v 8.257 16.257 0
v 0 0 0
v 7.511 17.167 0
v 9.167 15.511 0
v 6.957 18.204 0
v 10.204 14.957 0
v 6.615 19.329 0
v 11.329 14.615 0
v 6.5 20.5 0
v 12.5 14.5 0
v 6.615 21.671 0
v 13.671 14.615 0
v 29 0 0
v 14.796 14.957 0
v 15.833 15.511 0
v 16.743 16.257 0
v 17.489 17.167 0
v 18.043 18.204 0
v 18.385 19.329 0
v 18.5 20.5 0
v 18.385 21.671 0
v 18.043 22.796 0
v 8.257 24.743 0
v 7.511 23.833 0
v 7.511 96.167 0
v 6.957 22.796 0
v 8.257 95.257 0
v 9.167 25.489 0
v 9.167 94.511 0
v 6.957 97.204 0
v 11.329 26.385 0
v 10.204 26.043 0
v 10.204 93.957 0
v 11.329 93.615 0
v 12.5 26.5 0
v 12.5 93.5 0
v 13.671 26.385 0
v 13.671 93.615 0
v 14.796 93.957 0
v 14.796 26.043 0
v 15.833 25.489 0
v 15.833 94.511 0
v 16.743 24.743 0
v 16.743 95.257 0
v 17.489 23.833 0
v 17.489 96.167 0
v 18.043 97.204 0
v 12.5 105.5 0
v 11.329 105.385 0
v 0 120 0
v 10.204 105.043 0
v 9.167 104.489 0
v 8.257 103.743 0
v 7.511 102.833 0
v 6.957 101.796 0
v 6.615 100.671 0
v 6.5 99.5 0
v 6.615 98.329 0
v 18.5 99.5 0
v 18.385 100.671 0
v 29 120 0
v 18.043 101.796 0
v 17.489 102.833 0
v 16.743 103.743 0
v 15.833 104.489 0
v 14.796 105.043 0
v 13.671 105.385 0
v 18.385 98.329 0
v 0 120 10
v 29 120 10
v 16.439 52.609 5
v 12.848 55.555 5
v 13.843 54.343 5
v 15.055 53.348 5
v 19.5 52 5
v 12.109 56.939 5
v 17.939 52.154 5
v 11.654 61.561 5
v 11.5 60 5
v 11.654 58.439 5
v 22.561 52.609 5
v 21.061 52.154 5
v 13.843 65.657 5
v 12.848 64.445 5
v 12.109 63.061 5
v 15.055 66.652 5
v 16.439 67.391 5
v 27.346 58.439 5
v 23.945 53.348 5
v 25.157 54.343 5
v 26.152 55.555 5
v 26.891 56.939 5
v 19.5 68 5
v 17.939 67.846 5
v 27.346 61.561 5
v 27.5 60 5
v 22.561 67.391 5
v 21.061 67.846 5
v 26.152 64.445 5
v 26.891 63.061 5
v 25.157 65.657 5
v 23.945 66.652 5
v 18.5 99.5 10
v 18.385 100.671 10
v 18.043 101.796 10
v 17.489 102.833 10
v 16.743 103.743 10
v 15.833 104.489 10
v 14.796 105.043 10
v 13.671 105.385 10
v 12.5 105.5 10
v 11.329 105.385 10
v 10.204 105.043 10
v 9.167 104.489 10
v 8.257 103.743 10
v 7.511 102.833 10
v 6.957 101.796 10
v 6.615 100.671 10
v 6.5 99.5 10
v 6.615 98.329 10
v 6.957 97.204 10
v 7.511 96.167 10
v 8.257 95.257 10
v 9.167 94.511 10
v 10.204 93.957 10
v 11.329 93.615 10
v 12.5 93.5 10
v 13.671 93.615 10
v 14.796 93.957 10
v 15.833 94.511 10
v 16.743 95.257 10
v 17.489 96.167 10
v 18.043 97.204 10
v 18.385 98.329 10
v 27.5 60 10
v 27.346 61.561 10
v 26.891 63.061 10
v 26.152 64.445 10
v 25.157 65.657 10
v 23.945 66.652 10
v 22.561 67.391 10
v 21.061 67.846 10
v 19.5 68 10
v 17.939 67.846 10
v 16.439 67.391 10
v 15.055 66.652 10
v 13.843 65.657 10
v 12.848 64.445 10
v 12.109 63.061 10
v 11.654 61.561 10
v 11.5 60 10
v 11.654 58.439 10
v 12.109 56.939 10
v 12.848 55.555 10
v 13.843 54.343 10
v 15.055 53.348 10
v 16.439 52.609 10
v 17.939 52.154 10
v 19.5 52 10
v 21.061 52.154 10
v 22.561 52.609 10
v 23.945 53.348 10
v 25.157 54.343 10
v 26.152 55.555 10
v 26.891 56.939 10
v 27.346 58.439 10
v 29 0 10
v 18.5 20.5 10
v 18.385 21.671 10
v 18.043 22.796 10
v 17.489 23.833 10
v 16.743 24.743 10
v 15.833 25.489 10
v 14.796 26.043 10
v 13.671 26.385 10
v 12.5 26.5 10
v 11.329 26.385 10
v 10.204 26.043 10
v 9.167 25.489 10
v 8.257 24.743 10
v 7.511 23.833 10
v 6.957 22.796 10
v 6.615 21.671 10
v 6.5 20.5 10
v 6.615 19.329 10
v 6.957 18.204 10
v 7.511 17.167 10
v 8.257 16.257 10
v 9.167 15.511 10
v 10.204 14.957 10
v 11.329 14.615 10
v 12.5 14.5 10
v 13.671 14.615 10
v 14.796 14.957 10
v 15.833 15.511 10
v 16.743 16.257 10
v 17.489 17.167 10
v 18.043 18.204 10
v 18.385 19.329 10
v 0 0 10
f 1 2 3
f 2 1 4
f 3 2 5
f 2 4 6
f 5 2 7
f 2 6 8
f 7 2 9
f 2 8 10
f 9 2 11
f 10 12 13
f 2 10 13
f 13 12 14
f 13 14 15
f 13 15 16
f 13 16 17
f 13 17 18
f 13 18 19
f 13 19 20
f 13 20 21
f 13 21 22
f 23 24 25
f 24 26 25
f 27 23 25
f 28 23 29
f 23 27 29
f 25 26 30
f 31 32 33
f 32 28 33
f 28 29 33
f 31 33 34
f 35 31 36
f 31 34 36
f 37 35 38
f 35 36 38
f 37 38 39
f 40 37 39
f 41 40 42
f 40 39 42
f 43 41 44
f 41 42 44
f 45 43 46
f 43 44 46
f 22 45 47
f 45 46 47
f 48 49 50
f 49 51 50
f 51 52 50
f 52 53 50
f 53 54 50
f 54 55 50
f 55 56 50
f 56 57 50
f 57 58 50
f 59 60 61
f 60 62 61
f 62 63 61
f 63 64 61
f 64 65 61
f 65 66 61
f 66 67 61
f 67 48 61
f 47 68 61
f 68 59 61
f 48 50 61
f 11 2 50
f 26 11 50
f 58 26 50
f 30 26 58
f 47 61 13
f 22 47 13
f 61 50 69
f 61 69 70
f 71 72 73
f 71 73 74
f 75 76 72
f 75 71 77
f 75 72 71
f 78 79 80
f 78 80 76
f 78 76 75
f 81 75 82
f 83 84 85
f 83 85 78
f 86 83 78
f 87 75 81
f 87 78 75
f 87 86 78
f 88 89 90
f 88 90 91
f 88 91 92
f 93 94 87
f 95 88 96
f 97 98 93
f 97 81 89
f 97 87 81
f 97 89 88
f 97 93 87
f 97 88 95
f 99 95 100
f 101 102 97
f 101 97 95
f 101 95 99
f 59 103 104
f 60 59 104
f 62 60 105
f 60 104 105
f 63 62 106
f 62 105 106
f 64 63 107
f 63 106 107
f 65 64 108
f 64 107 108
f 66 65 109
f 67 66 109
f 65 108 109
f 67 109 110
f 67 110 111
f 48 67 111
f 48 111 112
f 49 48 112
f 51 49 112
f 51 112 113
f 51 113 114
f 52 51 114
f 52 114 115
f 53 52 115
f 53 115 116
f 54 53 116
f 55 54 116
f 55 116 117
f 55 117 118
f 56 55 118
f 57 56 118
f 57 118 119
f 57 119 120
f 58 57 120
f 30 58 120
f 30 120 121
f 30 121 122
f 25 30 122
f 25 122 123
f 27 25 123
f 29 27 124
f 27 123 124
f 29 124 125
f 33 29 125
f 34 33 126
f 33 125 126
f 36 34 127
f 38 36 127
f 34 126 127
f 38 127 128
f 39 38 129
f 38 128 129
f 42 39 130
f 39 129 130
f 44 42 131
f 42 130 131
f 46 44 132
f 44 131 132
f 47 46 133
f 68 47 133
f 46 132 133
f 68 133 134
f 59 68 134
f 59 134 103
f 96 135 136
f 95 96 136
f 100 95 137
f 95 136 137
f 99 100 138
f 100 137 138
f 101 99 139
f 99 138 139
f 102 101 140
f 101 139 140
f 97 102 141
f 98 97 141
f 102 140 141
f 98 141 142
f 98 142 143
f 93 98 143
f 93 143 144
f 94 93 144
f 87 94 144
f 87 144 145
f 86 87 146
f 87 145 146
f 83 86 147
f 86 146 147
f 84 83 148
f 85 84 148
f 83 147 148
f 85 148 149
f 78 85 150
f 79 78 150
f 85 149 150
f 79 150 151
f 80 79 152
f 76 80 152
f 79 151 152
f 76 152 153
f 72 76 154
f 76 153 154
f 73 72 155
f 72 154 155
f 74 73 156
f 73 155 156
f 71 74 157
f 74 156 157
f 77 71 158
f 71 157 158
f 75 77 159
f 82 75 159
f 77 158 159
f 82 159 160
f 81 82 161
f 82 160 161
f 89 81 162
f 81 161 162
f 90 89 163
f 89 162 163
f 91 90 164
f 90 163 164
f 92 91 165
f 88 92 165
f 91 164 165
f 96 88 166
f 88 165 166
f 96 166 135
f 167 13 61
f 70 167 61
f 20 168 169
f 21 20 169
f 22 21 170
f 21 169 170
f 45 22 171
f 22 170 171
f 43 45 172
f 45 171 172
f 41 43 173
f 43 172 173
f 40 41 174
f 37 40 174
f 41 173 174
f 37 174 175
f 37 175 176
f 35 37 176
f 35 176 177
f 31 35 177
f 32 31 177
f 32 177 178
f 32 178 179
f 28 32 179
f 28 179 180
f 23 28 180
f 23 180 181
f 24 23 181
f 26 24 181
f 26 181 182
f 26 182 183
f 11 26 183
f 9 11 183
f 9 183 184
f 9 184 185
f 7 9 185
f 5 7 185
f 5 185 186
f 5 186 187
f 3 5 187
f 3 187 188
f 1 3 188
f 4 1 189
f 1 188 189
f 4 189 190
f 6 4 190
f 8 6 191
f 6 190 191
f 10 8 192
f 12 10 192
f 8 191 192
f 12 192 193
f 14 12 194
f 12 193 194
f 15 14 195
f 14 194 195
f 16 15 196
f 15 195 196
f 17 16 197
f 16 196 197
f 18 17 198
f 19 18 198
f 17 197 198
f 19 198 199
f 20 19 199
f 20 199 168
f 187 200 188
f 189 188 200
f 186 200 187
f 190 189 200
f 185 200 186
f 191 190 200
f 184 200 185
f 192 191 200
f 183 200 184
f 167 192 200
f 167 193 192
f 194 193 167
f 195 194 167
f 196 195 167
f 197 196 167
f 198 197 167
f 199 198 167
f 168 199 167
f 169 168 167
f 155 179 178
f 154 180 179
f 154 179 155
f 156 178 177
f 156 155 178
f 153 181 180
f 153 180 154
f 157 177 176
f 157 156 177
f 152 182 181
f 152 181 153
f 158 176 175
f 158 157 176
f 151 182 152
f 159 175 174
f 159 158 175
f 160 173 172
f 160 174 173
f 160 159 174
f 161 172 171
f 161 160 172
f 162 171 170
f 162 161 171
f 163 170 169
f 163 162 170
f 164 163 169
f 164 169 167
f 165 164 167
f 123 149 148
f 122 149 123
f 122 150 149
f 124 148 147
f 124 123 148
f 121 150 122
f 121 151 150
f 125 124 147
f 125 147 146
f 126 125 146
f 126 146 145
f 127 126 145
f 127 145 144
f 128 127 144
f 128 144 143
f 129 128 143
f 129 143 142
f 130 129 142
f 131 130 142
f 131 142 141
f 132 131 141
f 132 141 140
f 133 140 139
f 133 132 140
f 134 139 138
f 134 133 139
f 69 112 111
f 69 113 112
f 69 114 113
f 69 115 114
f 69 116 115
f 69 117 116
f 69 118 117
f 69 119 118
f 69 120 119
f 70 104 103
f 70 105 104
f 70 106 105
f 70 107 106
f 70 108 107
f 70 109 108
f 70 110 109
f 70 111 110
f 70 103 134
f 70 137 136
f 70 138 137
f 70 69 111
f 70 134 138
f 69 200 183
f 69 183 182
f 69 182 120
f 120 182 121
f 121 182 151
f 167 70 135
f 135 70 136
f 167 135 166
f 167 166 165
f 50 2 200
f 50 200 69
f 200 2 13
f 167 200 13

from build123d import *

# Parameters (mm, degrees)
BOX_W           = 29
BOX_H           = 120
BOX_DEPTH       = 10
SKETCH_R        = 6
POCKET_DEPTH    = 10.001
SKETCH001_R     = 8
POCKET001_DEPTH = 5


with BuildPart() as part:
    # Box → Box (new body)
    with BuildSketch(Plane.XY):
        with Locations((14.5, 60)):
            Rectangle(BOX_W, BOX_H)
    extrude(amount=BOX_DEPTH)

    # Sketch → Pocket (cut, through all)
    with BuildSketch(Plane.XY.offset(10)):
        with Locations((12.5, 99.5)):
            Circle(SKETCH_R)
        with Locations((12.5, 20.5)):
            Circle(SKETCH_R)
    extrude(amount=-POCKET_DEPTH, mode=Mode.SUBTRACT)

    # Sketch001 → Pocket001 (cut)
    with BuildSketch(Plane.XY.offset(10)):
        with Locations((19.5, 60)):
            Circle(SKETCH001_R)
    extrude(amount=-POCKET001_DEPTH, mode=Mode.SUBTRACT)


solid = part.part
